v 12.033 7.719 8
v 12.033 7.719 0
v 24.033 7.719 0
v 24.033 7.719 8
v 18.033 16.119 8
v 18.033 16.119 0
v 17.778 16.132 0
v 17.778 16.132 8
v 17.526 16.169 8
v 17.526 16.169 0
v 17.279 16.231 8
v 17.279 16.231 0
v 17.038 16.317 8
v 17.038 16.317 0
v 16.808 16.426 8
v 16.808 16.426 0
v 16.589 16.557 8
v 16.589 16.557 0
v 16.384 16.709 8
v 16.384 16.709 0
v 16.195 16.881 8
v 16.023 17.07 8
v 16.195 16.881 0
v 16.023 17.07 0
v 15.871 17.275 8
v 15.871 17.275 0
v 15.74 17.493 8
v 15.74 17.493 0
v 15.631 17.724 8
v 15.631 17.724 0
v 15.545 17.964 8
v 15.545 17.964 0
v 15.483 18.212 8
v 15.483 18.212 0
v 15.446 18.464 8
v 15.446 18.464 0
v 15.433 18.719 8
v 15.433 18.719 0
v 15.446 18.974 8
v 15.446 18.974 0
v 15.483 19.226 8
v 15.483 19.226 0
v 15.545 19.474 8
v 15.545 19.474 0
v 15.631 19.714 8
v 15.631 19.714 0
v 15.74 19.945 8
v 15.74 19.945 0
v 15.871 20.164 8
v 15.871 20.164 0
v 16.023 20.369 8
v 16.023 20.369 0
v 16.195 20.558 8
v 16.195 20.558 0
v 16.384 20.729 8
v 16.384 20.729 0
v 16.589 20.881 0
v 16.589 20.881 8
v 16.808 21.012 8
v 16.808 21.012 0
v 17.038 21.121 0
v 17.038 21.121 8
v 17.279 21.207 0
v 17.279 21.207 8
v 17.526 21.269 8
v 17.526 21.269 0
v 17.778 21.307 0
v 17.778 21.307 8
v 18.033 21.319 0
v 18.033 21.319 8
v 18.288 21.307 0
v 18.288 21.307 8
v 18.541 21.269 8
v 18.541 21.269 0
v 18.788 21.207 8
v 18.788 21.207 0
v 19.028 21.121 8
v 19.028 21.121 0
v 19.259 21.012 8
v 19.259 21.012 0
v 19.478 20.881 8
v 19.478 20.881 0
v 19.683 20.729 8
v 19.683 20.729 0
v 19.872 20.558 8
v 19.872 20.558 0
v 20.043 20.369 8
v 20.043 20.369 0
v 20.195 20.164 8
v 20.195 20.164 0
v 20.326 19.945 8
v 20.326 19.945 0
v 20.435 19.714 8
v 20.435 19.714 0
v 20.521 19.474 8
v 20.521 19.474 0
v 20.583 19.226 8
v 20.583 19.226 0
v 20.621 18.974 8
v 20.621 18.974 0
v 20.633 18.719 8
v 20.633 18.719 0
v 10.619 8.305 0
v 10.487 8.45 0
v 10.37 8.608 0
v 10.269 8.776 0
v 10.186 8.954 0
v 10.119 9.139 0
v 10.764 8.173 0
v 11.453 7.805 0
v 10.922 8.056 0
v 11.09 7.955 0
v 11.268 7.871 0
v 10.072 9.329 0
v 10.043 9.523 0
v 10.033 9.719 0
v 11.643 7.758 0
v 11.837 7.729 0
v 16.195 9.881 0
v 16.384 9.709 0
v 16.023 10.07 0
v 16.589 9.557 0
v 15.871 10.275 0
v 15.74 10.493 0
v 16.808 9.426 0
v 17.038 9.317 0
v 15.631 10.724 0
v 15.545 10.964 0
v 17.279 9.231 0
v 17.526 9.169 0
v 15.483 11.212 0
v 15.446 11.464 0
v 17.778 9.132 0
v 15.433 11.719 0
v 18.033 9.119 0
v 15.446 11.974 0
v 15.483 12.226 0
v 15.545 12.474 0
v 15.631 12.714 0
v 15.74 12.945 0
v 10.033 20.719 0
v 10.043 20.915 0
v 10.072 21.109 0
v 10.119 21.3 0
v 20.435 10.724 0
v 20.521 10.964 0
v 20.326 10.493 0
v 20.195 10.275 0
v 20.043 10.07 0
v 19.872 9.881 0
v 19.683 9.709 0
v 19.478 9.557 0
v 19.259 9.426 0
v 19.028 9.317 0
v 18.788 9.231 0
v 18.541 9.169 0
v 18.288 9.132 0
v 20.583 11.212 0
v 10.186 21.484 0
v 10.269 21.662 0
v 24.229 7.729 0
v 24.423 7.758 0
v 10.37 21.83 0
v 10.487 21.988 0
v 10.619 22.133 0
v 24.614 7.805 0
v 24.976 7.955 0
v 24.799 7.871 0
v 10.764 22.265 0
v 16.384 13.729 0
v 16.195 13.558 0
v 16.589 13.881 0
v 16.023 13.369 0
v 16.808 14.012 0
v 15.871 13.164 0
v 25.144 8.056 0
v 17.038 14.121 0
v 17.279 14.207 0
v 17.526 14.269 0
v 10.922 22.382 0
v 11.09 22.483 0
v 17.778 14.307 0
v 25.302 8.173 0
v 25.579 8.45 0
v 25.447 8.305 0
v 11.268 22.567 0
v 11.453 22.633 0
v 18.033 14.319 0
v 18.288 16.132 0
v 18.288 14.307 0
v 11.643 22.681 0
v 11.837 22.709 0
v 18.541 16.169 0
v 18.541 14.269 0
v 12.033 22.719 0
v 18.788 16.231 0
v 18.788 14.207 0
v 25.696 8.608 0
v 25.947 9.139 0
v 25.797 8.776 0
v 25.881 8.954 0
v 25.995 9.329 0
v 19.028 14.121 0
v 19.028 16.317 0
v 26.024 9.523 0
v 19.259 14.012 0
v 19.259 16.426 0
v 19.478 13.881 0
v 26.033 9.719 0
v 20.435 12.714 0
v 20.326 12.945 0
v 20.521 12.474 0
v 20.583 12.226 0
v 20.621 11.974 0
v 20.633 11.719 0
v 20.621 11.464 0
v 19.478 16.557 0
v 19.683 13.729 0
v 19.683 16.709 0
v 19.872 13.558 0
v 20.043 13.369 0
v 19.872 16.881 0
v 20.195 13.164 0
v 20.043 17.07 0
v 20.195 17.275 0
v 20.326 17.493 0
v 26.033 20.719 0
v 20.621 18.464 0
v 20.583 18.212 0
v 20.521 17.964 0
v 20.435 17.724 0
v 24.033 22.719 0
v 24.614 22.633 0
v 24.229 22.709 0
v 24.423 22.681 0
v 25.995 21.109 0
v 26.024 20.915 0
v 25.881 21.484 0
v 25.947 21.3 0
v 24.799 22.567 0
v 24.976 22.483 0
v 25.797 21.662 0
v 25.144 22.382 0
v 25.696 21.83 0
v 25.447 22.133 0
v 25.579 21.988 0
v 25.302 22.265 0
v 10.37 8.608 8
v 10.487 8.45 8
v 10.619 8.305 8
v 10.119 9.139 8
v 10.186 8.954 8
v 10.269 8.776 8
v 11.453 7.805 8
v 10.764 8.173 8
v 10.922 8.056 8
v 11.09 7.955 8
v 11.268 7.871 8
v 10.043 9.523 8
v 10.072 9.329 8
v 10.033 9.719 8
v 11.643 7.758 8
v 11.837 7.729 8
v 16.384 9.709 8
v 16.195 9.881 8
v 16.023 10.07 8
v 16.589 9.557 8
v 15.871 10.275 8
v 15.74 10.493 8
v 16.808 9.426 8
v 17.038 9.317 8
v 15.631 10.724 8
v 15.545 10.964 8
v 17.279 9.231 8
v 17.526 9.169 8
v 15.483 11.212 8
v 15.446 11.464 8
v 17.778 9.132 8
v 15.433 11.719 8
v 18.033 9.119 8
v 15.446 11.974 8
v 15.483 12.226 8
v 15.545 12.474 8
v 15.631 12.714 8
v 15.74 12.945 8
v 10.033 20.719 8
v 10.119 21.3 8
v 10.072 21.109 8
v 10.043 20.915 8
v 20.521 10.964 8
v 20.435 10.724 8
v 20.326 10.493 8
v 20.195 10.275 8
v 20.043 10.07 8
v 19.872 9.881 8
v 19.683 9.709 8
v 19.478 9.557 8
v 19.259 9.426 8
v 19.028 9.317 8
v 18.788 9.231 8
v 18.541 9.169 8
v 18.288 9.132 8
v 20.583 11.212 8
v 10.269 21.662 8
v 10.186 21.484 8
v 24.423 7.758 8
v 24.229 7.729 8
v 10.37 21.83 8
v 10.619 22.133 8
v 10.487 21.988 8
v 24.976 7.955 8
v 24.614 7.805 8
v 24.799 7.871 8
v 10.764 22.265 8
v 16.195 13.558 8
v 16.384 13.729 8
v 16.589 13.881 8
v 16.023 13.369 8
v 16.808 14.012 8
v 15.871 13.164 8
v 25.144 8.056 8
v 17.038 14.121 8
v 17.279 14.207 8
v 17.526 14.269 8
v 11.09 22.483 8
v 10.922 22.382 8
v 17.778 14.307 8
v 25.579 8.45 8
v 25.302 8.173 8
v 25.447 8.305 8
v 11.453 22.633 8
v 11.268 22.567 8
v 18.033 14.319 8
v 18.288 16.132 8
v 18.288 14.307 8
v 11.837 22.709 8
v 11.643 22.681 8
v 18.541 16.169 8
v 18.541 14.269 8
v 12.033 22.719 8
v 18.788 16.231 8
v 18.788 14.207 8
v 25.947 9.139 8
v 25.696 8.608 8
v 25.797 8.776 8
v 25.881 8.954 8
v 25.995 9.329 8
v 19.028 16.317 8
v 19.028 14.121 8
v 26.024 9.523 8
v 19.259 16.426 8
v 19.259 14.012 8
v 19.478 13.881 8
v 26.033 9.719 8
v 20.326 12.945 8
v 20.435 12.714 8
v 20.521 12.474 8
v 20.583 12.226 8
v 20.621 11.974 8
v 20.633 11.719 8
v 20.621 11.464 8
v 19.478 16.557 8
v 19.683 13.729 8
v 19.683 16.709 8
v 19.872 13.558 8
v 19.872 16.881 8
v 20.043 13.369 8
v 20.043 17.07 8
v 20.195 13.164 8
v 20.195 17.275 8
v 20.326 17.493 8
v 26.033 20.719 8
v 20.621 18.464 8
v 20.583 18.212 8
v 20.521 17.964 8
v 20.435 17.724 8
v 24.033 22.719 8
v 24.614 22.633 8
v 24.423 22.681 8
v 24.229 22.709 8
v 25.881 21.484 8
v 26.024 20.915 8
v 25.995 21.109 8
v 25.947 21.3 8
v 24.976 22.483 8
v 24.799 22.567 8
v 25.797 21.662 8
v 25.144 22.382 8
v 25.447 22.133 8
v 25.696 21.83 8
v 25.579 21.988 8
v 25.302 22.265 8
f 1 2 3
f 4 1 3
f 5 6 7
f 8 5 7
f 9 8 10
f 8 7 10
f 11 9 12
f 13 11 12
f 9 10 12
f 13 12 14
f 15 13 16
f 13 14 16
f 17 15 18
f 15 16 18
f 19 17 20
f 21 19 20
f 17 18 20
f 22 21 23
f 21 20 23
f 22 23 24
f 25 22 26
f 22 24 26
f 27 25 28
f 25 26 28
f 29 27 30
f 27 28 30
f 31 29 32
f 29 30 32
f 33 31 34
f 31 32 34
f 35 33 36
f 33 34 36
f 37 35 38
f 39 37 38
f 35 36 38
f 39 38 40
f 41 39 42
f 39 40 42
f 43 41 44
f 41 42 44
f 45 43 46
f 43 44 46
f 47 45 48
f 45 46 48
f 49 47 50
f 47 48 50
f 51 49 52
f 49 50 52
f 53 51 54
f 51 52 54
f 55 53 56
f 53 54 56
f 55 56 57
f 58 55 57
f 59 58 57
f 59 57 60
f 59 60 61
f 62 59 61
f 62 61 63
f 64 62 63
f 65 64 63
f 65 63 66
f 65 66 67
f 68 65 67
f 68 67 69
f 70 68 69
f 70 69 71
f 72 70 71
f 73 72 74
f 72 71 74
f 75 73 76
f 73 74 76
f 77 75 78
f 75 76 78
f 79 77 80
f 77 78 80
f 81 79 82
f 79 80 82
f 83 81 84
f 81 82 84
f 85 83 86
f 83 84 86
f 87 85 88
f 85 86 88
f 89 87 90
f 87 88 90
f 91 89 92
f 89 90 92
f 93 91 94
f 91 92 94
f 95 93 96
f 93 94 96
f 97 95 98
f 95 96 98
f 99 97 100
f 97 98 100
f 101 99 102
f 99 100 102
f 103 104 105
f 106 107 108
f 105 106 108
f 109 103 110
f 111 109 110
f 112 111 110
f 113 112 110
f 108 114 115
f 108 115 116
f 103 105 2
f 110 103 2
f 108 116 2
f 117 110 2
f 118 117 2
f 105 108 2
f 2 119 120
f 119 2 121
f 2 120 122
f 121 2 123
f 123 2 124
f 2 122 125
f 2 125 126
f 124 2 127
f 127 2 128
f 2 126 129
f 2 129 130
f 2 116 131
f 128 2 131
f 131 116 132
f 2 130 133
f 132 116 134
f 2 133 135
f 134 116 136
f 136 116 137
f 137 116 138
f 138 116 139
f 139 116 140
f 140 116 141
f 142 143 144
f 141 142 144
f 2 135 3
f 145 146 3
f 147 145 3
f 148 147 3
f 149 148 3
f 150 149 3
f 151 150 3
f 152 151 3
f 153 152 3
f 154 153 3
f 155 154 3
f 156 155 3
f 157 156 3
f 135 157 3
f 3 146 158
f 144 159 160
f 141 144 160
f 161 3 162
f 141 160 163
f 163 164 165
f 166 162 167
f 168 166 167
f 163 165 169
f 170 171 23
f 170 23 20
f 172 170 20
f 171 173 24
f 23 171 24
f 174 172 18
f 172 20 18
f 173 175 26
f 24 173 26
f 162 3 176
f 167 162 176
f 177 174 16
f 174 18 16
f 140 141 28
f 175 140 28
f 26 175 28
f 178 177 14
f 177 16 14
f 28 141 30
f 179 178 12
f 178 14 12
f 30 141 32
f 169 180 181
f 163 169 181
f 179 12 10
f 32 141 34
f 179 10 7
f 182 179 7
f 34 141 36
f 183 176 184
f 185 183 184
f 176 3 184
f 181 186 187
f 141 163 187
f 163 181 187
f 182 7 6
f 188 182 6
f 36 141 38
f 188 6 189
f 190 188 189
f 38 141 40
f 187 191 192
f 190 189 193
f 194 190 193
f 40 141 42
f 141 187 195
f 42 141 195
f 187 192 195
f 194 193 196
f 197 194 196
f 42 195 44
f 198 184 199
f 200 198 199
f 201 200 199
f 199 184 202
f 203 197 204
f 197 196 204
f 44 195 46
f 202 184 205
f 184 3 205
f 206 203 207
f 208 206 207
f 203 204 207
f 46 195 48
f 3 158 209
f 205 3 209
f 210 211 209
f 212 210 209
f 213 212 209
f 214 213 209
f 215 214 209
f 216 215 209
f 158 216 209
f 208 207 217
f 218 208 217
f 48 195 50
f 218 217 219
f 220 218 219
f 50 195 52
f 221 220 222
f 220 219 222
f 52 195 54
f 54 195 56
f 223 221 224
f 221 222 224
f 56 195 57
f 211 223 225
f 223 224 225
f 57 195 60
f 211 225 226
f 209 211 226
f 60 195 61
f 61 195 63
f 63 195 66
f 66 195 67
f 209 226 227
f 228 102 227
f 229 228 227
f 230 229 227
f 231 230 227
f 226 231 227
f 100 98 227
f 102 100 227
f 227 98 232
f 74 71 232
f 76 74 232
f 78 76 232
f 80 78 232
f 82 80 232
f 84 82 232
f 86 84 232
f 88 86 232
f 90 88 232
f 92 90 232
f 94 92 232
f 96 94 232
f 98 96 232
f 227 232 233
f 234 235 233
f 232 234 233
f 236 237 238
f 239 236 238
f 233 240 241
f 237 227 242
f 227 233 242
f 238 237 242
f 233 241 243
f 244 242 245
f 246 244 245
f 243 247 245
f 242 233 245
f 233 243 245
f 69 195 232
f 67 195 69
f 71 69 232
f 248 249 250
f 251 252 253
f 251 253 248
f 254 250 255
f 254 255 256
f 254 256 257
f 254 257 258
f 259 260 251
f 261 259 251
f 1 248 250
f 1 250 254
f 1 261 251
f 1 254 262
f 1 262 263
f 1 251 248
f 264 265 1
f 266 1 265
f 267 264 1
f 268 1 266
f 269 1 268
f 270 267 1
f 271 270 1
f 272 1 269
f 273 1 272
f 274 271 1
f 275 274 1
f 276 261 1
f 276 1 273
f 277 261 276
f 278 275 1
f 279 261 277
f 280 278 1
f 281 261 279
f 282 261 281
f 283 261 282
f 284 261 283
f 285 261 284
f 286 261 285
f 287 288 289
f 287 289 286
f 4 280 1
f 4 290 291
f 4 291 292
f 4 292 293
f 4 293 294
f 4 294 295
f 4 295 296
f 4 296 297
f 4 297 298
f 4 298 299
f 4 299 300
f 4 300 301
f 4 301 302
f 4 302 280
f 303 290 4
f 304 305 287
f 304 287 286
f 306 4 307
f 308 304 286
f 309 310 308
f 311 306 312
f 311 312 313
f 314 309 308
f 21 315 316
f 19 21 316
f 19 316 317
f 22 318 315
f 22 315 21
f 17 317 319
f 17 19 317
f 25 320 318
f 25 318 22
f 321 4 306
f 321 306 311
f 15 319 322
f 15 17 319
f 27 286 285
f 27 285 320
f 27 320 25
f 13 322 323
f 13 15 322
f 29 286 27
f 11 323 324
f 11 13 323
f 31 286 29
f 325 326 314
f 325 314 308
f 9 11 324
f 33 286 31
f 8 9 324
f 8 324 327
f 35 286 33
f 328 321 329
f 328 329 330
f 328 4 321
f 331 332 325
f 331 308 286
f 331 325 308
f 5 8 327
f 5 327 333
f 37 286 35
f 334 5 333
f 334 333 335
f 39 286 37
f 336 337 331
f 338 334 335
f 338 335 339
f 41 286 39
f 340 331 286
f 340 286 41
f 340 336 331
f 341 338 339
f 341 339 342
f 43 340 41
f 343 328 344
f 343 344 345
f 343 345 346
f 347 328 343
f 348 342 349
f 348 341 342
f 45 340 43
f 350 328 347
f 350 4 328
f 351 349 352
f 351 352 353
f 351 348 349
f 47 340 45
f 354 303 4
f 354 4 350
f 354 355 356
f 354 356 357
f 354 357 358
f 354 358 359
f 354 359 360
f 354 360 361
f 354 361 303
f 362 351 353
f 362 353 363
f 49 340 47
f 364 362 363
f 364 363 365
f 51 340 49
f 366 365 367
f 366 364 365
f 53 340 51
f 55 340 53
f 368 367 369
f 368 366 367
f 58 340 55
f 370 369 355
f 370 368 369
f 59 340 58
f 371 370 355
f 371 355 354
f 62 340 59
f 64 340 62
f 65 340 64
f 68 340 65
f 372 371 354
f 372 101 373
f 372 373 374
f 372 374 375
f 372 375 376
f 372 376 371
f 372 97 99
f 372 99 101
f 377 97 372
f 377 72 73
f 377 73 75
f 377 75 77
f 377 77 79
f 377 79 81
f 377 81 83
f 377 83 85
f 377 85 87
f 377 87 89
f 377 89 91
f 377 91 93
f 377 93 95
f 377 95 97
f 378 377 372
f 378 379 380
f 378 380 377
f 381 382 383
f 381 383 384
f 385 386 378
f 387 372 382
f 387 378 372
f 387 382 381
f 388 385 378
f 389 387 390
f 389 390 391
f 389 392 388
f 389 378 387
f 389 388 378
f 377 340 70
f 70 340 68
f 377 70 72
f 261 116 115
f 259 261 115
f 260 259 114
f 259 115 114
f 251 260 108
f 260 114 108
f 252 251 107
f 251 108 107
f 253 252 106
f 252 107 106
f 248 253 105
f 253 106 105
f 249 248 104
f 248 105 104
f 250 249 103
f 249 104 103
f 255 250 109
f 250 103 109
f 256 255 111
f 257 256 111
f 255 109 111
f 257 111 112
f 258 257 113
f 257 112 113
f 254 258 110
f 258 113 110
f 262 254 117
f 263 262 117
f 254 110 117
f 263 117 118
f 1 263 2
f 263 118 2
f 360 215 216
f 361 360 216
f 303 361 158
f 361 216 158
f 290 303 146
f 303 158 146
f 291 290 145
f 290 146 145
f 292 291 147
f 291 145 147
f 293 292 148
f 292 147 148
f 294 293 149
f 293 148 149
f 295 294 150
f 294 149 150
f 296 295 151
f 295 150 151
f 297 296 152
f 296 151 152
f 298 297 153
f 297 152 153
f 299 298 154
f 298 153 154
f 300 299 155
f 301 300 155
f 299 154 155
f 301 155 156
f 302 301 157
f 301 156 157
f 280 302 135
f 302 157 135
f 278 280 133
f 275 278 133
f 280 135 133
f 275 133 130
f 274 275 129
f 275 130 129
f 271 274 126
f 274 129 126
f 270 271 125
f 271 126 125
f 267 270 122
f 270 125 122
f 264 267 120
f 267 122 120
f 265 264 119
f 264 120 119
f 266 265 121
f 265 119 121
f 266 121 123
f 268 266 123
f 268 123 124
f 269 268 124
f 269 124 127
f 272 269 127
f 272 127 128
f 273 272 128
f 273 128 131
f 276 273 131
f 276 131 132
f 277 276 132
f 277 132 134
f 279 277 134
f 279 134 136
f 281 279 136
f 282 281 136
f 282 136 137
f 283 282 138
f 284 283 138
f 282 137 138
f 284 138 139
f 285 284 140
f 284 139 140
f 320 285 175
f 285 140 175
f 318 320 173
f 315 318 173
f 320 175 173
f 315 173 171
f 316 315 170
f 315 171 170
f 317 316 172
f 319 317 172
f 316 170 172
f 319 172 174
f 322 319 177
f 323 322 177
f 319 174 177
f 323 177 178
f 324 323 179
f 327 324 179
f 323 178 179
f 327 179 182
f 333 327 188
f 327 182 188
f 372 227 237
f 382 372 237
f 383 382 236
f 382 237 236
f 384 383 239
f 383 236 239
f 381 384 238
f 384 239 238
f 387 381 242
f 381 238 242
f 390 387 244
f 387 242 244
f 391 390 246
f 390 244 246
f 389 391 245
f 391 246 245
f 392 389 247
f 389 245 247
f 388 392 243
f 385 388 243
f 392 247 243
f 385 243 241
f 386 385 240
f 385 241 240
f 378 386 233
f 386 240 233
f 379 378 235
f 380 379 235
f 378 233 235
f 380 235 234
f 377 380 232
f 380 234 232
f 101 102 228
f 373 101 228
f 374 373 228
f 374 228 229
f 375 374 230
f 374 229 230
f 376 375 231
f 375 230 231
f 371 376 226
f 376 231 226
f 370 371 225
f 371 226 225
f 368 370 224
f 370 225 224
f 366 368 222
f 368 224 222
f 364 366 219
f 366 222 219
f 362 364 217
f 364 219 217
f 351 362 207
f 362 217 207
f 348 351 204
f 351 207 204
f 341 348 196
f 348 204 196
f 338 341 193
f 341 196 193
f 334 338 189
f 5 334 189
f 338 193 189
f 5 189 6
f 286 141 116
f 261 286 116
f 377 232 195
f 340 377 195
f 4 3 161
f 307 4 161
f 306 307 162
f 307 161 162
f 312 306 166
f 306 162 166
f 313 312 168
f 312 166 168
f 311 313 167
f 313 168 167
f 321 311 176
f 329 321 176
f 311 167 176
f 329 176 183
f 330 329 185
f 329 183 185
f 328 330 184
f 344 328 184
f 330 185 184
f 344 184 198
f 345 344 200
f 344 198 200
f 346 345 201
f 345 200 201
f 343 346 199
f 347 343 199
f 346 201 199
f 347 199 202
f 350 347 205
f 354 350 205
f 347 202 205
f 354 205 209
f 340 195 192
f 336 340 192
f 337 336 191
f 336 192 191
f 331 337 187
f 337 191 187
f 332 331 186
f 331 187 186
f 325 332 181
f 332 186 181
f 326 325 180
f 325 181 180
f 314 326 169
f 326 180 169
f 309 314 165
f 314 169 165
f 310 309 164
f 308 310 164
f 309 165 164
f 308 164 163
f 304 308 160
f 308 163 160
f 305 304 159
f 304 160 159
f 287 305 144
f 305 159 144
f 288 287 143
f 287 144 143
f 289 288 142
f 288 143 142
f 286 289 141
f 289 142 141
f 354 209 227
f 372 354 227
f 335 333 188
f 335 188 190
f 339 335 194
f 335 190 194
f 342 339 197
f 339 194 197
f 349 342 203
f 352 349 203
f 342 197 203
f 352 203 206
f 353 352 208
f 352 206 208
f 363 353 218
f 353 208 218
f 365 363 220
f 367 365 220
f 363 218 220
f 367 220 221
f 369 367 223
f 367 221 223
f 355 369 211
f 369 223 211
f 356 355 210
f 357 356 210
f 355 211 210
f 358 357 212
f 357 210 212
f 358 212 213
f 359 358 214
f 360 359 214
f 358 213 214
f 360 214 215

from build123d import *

# Parameters (mm, degrees)
F1_DEPTH = 8


with BuildPart() as f1:
    # F0 (on Top) → F1 (new body)
    with BuildSketch(Plane.XY):
        with BuildLine():
            Line((24.033267, 22.719095), (12.033267, 22.719095))
            ThreePointArc((12.033267, 22.719095), (10.619054, 22.133308), (10.033267, 20.719095))
            Line((10.033267, 20.719095), (10.033267, 9.719095))
            ThreePointArc((10.033267, 9.719095), (10.619054, 8.304881), (12.033267, 7.719095))
            Line((12.033267, 7.719095), (24.033267, 7.719095))
            ThreePointArc((24.033267, 7.719095), (25.447481, 8.304881), (26.033267, 9.719095))
            Line((26.033267, 9.719095), (26.033267, 20.719095))
            ThreePointArc((26.033267, 20.719095), (25.447481, 22.133308), (24.033267, 22.719095))
        make_face()
        with BuildLine():
            ThreePointArc((20.633267, 11.719095), (16.19479, 9.880617), (18.033267, 14.319095))
            ThreePointArc((18.033267, 14.319095), (19.871745, 13.557572), (20.633267, 11.719095))
        make_face(mode=Mode.SUBTRACT)
        with BuildLine():
            ThreePointArc((18.033267, 16.119095), (16.19479, 20.557572), (20.633267, 18.719095))
            ThreePointArc((20.633267, 18.719095), (19.871745, 16.880617), (18.033267, 16.119095))
        make_face(mode=Mode.SUBTRACT)
    extrude(amount=F1_DEPTH)


solid = f1.part
